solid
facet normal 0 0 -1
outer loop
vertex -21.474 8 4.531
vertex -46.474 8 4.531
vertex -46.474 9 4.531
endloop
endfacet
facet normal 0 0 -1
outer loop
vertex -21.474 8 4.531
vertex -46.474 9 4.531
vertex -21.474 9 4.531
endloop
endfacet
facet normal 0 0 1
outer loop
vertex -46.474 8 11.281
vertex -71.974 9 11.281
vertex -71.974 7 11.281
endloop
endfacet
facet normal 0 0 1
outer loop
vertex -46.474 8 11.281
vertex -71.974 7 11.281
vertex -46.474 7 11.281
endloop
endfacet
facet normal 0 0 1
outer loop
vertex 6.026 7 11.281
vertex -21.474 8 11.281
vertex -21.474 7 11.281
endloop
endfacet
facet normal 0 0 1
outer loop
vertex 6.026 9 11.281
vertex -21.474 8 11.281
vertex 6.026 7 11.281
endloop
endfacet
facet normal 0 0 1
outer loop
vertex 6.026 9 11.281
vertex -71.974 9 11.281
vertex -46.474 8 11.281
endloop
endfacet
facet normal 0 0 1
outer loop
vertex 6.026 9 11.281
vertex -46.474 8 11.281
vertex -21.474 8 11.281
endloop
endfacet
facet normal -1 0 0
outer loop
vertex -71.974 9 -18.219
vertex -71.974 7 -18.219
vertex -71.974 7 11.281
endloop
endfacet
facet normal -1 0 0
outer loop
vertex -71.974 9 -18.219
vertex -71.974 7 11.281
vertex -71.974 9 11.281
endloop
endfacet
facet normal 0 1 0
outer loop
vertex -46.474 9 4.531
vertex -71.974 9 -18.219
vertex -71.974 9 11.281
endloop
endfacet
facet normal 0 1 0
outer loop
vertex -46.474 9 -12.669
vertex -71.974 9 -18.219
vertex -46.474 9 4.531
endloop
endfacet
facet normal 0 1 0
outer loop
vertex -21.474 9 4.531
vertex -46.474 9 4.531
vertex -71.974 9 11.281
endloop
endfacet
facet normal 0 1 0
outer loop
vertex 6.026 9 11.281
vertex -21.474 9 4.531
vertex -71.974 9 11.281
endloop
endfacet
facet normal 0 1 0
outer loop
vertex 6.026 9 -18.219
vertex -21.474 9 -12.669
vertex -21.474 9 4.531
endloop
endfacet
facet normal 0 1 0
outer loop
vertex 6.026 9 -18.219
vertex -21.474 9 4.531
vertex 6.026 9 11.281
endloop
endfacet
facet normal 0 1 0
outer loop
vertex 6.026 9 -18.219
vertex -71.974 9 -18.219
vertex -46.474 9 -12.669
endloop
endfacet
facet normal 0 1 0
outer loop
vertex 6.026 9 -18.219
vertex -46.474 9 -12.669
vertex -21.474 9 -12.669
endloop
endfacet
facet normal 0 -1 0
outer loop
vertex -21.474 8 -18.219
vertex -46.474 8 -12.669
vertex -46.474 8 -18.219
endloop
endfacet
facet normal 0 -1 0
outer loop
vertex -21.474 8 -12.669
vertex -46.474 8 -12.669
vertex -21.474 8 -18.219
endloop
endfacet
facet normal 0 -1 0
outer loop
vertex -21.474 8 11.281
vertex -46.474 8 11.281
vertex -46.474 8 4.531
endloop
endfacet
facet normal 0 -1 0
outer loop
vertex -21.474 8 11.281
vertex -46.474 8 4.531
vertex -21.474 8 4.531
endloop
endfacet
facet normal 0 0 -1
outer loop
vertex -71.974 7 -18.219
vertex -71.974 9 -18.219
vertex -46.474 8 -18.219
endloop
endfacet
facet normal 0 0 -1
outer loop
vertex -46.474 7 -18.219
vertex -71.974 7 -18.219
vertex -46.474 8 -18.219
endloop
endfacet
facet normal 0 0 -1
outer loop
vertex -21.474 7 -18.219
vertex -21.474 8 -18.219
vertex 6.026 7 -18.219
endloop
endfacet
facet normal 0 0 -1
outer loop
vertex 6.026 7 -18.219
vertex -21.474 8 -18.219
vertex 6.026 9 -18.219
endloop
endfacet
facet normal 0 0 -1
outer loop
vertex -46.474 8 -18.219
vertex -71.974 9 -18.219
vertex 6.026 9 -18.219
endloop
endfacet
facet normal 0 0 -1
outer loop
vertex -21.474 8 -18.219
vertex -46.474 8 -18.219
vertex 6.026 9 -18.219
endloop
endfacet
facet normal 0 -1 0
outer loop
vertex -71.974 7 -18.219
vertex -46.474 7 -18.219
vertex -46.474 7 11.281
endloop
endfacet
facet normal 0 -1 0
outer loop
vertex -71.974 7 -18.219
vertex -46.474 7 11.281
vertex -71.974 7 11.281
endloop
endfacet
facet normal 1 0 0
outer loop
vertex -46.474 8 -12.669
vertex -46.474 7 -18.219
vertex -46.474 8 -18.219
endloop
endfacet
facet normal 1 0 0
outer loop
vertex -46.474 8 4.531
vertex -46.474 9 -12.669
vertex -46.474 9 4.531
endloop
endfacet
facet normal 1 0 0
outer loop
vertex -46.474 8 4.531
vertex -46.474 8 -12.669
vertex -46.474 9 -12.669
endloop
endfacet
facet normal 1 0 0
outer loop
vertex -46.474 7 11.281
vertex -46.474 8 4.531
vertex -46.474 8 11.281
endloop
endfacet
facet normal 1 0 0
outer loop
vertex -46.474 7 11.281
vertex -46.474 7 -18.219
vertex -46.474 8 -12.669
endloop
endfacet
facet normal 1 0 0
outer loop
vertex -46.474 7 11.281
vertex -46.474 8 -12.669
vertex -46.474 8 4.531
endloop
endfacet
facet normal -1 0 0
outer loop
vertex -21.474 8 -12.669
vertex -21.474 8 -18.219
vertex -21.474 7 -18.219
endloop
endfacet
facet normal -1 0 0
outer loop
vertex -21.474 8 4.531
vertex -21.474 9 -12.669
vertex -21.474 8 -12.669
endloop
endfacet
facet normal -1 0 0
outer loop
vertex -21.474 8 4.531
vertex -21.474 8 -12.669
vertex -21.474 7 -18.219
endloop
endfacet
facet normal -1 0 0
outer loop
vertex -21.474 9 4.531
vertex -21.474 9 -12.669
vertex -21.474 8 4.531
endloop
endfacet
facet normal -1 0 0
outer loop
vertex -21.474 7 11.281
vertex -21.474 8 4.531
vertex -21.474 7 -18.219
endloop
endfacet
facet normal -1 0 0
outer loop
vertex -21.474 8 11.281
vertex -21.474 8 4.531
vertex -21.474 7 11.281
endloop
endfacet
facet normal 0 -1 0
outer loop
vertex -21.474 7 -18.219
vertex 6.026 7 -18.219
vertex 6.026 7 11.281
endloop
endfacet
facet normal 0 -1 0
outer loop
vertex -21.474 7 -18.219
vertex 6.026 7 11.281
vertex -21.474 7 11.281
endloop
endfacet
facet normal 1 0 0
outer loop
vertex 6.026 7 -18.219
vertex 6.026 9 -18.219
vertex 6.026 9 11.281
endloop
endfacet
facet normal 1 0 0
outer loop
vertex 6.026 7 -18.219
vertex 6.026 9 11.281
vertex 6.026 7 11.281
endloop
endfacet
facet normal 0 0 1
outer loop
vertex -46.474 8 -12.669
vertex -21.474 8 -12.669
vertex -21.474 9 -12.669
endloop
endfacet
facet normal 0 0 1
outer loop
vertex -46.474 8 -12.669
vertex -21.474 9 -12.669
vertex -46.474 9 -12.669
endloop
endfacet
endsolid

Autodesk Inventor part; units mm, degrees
ref_plane "YZ Plane" through (0, 0, 0) normal (1, 0, 0) x (0, 1, 0)
ref_plane "XZ Plane" through (0, 0, 0) normal (0, 1, 0) x (-1, 0, 0)
sketch "Sketch1" plane through (0, 0, 0) normal (0, 1, 0) x (-1, 0, 0)
  line L0 (71.974, 9.2811) -> (-6.026, 9.2811)
  line L1 (-6.026, 9.2811) -> (-6.026, -18.2189)
  line L2 (-6.026, -18.2189) -> (71.974, -18.2189)
  line L3 (71.974, -18.2189) -> (71.974, 9.2811)
  point P0 (0, 0)
  dimension "d0" = 27.5
  dimension "d1" = 78
extrude "Extrusion1" add sketch "Sketch1" along normal blind 9
sketch "Sketch2" plane through (0, 9, 0) normal (0, 1, 0) x (1, 0, 0)
  line L0 (6.026, 18.2189) -> (-71.974, 18.2189) projected
  line L1 (-71.974, -9.2811) -> (6.026, -9.2811) projected
  line L2 (6.026, 18.2189) -> (-19.474, 18.2189)
  line L3 (-19.474, 18.2189) -> (-19.474, -9.2811)
  line L4 (-19.474, -9.2811) -> (6.026, -9.2811)
  line L5 (6.026, -9.2811) -> (6.026, 18.2189)
  point P0 (0, 0)
  point P1 (6.026, -9.2811)
  point P2 (-19.474, 18.2189)
  dimension "d4" = 25.5
extrude "Extrusion2" cut sketch "Sketch2" against normal blind 7
sketch "Sketch3" plane through (0, 2, 0) normal (0, 1, 0) x (1, 0, 0)
  point P0 (0, 0)
sketch "Sketch4" plane through (0, 2, 0) normal (0, 1, 0) x (1, 0, 0)
  line L0 (-19.474, -9.2811) -> (-19.474, 18.2189) projected
  line L1 (6.026, -9.2811) -> (6.026, 18.2189) projected
  line L2 (-19.474, 18.2189) -> (6.026, 18.2189)
  line L3 (6.026, 18.2189) -> (6.026, 16.7189)
  line L4 (6.026, 16.7189) -> (-19.474, 16.7189)
  line L5 (-19.474, 16.7189) -> (-19.474, 18.2189)
  point P0 (0, 0)
  point P1 (6.026, 18.2189)
  point P2 (-19.474, 16.7189)
  dimension "d7" = 1.5
extrude "Extrusion3" add sketch "Sketch4" along normal blind 7
sketch "Sketch5" plane through (-71.974, 0, 9.2811) normal (0, 0, 1) x (1, 0, 0)
  line L0 (0, 9) -> (52.5, 9) projected
  line L1 (50.5, 9) -> (50.5, 0)
  line L2 (0, 0) -> (78, 0) projected
  line L3 (52.5, 2) -> (52.5, 9) projected
  line L4 (50.5, 7) -> (0, 7)
  line L5 (52.5, 2) -> (52.5, 9) projected
  line L6 (0, 9) -> (52.5, 9) projected
  line L7 (0, 0) -> (0, 9) projected
  line L8 (0, 0) -> (78, 0) projected
  line L9 (78, 0) -> (78, 2) projected
  line L10 (78, 2) -> (52.5, 2) projected
  point P0 (71.974, 0)
  point P1 (0, 7)
  dimension "d10" = 2
  dimension "d11" = 2
extrude "Extrusion4" cut sketch "Sketch5" against normal blind 44 contours L4 L1 L2 L7
sketch "Sketch8" plane through (-71.974, 7, 9.2811) normal (0, -1, 0) x (1, 0, 0)
  line L0 (50.5, -21.9505) -> (25.5, -21.9505)
  line L1 (25.5, -21.9505) -> (25.5, -4.7505)
  line L2 (25.5, -4.7505) -> (50.5, -4.7505)
  line L3 (50.5, -4.7505) -> (50.5, -21.9505)
  line L4 (50.5, 0) -> (50.5, -27.5) projected
  point P0 (71.974, -9.2811)
  dimension "d20" = 17.2
  dimension "d21" = 25
  dimension "d22" = 0
extrude "Extrusion6" cut sketch "Sketch8" against normal blind 2
ref_plane "Work Plane2" through (-21.474, 0, -18.2189) normal (-1, 0, 0) x (0, 0, 1)
split "Split2" plane through (-21.474, 0, -18.2189) removes the side toward (1, 0, 0)
sketch "Sketch10" plane through (0, 9, 0) normal (0, 1, 0) x (1, 0, 0)
  line L0 (-71.974, 18.2189) -> (6.026, 18.2189)
  line L1 (6.026, 18.2189) -> (6.026, -9.2811)
  line L2 (6.026, -9.2811) -> (-71.974, -9.2811)
  line L3 (-71.974, -9.2811) -> (-71.974, 18.2189)
  line L4 (-21.474, 12.6694) -> (-46.474, 12.6694) projected
  line L5 (-21.474, 12.6694) -> (-21.474, -9.2811)
  line L6 (-21.474, -9.2811) -> (-21.474, -4.5306) projected
  line L7 (-21.474, -4.5306) -> (-46.474, -4.5306) projected
  line L8 (-46.474, -4.5306) -> (-46.474, 12.6694) projected
  line L9 (-46.474, 12.6694) -> (-21.474, 12.6694) projected
  line L10 (-21.474, 12.6694) -> (-21.474, 18.2189) projected
  line L11 (-21.474, 18.2189) -> (-71.974, 18.2189) projected
  line L12 (-71.974, 18.2189) -> (-71.974, -9.2811) projected
  line L13 (-71.974, -9.2811) -> (-21.474, -9.2811) projected
  point P0 (0, 0)
  dimension "d32" = 78
  dimension "d33" = 27.5
extrude "Extrusion7" add sketch "Sketch10" against normal blind 2 contours L0 L1 L2 L5 L10
sketch "Sketch11" plane through (-71.974, 7, 9.2811) normal (0, 0, 1) x (1, 0, 0)
  line L0 (0, 2) -> (78, 2) projected
  line L1 (0, 0) -> (0, 2) projected
  line L2 (78, 0) -> (0, 0) projected
  line L3 (78, 2) -> (78, 0) projected
  point P0 (71.974, -7)
extrude "Extrusion8" add sketch "Sketch11" along normal blind 2
sketch "Sketch12" plane through (-71.974, 7, -18.2189) normal (0, -1, 0) x (1, 0, 0)
  line L0 (0, 0) -> (0, 29.5) projected
  line L1 (78, 0) -> (0, 0) projected
  line L2 (78, 0) -> (78, 29.5) projected
  line L3 (0, 29.5) -> (78, 29.5) projected
  line L4 (50.5, 22.7495) -> (50.5, 5.5495) projected
  line L5 (50.5, 5.5495) -> (25.5, 5.5495) projected
  line L6 (25.5, 5.5495) -> (25.5, 22.7495) projected
  line L7 (25.5, 22.7495) -> (50.5, 22.7495) projected
  line L8 (78, 0) -> (0, 0) projected
  line L9 (50.5, 0) -> (25.5, 0)
  line L10 (25.5, 0) -> (25.5, 29.5)
  line L11 (25.5, 29.5) -> (50.5, 29.5)
  line L12 (50.5, 29.5) -> (50.5, 0)
  point P0 (71.974, 18.2189)
  point P1 (50.5, 0)
  point P2 (25.5, 0)
extrude "Extrusion9" cut sketch "Sketch12" against normal blind 1 contours L10 L5 L12 L1 | L3 L12 L7 L10
properties part number "pokrywka"
